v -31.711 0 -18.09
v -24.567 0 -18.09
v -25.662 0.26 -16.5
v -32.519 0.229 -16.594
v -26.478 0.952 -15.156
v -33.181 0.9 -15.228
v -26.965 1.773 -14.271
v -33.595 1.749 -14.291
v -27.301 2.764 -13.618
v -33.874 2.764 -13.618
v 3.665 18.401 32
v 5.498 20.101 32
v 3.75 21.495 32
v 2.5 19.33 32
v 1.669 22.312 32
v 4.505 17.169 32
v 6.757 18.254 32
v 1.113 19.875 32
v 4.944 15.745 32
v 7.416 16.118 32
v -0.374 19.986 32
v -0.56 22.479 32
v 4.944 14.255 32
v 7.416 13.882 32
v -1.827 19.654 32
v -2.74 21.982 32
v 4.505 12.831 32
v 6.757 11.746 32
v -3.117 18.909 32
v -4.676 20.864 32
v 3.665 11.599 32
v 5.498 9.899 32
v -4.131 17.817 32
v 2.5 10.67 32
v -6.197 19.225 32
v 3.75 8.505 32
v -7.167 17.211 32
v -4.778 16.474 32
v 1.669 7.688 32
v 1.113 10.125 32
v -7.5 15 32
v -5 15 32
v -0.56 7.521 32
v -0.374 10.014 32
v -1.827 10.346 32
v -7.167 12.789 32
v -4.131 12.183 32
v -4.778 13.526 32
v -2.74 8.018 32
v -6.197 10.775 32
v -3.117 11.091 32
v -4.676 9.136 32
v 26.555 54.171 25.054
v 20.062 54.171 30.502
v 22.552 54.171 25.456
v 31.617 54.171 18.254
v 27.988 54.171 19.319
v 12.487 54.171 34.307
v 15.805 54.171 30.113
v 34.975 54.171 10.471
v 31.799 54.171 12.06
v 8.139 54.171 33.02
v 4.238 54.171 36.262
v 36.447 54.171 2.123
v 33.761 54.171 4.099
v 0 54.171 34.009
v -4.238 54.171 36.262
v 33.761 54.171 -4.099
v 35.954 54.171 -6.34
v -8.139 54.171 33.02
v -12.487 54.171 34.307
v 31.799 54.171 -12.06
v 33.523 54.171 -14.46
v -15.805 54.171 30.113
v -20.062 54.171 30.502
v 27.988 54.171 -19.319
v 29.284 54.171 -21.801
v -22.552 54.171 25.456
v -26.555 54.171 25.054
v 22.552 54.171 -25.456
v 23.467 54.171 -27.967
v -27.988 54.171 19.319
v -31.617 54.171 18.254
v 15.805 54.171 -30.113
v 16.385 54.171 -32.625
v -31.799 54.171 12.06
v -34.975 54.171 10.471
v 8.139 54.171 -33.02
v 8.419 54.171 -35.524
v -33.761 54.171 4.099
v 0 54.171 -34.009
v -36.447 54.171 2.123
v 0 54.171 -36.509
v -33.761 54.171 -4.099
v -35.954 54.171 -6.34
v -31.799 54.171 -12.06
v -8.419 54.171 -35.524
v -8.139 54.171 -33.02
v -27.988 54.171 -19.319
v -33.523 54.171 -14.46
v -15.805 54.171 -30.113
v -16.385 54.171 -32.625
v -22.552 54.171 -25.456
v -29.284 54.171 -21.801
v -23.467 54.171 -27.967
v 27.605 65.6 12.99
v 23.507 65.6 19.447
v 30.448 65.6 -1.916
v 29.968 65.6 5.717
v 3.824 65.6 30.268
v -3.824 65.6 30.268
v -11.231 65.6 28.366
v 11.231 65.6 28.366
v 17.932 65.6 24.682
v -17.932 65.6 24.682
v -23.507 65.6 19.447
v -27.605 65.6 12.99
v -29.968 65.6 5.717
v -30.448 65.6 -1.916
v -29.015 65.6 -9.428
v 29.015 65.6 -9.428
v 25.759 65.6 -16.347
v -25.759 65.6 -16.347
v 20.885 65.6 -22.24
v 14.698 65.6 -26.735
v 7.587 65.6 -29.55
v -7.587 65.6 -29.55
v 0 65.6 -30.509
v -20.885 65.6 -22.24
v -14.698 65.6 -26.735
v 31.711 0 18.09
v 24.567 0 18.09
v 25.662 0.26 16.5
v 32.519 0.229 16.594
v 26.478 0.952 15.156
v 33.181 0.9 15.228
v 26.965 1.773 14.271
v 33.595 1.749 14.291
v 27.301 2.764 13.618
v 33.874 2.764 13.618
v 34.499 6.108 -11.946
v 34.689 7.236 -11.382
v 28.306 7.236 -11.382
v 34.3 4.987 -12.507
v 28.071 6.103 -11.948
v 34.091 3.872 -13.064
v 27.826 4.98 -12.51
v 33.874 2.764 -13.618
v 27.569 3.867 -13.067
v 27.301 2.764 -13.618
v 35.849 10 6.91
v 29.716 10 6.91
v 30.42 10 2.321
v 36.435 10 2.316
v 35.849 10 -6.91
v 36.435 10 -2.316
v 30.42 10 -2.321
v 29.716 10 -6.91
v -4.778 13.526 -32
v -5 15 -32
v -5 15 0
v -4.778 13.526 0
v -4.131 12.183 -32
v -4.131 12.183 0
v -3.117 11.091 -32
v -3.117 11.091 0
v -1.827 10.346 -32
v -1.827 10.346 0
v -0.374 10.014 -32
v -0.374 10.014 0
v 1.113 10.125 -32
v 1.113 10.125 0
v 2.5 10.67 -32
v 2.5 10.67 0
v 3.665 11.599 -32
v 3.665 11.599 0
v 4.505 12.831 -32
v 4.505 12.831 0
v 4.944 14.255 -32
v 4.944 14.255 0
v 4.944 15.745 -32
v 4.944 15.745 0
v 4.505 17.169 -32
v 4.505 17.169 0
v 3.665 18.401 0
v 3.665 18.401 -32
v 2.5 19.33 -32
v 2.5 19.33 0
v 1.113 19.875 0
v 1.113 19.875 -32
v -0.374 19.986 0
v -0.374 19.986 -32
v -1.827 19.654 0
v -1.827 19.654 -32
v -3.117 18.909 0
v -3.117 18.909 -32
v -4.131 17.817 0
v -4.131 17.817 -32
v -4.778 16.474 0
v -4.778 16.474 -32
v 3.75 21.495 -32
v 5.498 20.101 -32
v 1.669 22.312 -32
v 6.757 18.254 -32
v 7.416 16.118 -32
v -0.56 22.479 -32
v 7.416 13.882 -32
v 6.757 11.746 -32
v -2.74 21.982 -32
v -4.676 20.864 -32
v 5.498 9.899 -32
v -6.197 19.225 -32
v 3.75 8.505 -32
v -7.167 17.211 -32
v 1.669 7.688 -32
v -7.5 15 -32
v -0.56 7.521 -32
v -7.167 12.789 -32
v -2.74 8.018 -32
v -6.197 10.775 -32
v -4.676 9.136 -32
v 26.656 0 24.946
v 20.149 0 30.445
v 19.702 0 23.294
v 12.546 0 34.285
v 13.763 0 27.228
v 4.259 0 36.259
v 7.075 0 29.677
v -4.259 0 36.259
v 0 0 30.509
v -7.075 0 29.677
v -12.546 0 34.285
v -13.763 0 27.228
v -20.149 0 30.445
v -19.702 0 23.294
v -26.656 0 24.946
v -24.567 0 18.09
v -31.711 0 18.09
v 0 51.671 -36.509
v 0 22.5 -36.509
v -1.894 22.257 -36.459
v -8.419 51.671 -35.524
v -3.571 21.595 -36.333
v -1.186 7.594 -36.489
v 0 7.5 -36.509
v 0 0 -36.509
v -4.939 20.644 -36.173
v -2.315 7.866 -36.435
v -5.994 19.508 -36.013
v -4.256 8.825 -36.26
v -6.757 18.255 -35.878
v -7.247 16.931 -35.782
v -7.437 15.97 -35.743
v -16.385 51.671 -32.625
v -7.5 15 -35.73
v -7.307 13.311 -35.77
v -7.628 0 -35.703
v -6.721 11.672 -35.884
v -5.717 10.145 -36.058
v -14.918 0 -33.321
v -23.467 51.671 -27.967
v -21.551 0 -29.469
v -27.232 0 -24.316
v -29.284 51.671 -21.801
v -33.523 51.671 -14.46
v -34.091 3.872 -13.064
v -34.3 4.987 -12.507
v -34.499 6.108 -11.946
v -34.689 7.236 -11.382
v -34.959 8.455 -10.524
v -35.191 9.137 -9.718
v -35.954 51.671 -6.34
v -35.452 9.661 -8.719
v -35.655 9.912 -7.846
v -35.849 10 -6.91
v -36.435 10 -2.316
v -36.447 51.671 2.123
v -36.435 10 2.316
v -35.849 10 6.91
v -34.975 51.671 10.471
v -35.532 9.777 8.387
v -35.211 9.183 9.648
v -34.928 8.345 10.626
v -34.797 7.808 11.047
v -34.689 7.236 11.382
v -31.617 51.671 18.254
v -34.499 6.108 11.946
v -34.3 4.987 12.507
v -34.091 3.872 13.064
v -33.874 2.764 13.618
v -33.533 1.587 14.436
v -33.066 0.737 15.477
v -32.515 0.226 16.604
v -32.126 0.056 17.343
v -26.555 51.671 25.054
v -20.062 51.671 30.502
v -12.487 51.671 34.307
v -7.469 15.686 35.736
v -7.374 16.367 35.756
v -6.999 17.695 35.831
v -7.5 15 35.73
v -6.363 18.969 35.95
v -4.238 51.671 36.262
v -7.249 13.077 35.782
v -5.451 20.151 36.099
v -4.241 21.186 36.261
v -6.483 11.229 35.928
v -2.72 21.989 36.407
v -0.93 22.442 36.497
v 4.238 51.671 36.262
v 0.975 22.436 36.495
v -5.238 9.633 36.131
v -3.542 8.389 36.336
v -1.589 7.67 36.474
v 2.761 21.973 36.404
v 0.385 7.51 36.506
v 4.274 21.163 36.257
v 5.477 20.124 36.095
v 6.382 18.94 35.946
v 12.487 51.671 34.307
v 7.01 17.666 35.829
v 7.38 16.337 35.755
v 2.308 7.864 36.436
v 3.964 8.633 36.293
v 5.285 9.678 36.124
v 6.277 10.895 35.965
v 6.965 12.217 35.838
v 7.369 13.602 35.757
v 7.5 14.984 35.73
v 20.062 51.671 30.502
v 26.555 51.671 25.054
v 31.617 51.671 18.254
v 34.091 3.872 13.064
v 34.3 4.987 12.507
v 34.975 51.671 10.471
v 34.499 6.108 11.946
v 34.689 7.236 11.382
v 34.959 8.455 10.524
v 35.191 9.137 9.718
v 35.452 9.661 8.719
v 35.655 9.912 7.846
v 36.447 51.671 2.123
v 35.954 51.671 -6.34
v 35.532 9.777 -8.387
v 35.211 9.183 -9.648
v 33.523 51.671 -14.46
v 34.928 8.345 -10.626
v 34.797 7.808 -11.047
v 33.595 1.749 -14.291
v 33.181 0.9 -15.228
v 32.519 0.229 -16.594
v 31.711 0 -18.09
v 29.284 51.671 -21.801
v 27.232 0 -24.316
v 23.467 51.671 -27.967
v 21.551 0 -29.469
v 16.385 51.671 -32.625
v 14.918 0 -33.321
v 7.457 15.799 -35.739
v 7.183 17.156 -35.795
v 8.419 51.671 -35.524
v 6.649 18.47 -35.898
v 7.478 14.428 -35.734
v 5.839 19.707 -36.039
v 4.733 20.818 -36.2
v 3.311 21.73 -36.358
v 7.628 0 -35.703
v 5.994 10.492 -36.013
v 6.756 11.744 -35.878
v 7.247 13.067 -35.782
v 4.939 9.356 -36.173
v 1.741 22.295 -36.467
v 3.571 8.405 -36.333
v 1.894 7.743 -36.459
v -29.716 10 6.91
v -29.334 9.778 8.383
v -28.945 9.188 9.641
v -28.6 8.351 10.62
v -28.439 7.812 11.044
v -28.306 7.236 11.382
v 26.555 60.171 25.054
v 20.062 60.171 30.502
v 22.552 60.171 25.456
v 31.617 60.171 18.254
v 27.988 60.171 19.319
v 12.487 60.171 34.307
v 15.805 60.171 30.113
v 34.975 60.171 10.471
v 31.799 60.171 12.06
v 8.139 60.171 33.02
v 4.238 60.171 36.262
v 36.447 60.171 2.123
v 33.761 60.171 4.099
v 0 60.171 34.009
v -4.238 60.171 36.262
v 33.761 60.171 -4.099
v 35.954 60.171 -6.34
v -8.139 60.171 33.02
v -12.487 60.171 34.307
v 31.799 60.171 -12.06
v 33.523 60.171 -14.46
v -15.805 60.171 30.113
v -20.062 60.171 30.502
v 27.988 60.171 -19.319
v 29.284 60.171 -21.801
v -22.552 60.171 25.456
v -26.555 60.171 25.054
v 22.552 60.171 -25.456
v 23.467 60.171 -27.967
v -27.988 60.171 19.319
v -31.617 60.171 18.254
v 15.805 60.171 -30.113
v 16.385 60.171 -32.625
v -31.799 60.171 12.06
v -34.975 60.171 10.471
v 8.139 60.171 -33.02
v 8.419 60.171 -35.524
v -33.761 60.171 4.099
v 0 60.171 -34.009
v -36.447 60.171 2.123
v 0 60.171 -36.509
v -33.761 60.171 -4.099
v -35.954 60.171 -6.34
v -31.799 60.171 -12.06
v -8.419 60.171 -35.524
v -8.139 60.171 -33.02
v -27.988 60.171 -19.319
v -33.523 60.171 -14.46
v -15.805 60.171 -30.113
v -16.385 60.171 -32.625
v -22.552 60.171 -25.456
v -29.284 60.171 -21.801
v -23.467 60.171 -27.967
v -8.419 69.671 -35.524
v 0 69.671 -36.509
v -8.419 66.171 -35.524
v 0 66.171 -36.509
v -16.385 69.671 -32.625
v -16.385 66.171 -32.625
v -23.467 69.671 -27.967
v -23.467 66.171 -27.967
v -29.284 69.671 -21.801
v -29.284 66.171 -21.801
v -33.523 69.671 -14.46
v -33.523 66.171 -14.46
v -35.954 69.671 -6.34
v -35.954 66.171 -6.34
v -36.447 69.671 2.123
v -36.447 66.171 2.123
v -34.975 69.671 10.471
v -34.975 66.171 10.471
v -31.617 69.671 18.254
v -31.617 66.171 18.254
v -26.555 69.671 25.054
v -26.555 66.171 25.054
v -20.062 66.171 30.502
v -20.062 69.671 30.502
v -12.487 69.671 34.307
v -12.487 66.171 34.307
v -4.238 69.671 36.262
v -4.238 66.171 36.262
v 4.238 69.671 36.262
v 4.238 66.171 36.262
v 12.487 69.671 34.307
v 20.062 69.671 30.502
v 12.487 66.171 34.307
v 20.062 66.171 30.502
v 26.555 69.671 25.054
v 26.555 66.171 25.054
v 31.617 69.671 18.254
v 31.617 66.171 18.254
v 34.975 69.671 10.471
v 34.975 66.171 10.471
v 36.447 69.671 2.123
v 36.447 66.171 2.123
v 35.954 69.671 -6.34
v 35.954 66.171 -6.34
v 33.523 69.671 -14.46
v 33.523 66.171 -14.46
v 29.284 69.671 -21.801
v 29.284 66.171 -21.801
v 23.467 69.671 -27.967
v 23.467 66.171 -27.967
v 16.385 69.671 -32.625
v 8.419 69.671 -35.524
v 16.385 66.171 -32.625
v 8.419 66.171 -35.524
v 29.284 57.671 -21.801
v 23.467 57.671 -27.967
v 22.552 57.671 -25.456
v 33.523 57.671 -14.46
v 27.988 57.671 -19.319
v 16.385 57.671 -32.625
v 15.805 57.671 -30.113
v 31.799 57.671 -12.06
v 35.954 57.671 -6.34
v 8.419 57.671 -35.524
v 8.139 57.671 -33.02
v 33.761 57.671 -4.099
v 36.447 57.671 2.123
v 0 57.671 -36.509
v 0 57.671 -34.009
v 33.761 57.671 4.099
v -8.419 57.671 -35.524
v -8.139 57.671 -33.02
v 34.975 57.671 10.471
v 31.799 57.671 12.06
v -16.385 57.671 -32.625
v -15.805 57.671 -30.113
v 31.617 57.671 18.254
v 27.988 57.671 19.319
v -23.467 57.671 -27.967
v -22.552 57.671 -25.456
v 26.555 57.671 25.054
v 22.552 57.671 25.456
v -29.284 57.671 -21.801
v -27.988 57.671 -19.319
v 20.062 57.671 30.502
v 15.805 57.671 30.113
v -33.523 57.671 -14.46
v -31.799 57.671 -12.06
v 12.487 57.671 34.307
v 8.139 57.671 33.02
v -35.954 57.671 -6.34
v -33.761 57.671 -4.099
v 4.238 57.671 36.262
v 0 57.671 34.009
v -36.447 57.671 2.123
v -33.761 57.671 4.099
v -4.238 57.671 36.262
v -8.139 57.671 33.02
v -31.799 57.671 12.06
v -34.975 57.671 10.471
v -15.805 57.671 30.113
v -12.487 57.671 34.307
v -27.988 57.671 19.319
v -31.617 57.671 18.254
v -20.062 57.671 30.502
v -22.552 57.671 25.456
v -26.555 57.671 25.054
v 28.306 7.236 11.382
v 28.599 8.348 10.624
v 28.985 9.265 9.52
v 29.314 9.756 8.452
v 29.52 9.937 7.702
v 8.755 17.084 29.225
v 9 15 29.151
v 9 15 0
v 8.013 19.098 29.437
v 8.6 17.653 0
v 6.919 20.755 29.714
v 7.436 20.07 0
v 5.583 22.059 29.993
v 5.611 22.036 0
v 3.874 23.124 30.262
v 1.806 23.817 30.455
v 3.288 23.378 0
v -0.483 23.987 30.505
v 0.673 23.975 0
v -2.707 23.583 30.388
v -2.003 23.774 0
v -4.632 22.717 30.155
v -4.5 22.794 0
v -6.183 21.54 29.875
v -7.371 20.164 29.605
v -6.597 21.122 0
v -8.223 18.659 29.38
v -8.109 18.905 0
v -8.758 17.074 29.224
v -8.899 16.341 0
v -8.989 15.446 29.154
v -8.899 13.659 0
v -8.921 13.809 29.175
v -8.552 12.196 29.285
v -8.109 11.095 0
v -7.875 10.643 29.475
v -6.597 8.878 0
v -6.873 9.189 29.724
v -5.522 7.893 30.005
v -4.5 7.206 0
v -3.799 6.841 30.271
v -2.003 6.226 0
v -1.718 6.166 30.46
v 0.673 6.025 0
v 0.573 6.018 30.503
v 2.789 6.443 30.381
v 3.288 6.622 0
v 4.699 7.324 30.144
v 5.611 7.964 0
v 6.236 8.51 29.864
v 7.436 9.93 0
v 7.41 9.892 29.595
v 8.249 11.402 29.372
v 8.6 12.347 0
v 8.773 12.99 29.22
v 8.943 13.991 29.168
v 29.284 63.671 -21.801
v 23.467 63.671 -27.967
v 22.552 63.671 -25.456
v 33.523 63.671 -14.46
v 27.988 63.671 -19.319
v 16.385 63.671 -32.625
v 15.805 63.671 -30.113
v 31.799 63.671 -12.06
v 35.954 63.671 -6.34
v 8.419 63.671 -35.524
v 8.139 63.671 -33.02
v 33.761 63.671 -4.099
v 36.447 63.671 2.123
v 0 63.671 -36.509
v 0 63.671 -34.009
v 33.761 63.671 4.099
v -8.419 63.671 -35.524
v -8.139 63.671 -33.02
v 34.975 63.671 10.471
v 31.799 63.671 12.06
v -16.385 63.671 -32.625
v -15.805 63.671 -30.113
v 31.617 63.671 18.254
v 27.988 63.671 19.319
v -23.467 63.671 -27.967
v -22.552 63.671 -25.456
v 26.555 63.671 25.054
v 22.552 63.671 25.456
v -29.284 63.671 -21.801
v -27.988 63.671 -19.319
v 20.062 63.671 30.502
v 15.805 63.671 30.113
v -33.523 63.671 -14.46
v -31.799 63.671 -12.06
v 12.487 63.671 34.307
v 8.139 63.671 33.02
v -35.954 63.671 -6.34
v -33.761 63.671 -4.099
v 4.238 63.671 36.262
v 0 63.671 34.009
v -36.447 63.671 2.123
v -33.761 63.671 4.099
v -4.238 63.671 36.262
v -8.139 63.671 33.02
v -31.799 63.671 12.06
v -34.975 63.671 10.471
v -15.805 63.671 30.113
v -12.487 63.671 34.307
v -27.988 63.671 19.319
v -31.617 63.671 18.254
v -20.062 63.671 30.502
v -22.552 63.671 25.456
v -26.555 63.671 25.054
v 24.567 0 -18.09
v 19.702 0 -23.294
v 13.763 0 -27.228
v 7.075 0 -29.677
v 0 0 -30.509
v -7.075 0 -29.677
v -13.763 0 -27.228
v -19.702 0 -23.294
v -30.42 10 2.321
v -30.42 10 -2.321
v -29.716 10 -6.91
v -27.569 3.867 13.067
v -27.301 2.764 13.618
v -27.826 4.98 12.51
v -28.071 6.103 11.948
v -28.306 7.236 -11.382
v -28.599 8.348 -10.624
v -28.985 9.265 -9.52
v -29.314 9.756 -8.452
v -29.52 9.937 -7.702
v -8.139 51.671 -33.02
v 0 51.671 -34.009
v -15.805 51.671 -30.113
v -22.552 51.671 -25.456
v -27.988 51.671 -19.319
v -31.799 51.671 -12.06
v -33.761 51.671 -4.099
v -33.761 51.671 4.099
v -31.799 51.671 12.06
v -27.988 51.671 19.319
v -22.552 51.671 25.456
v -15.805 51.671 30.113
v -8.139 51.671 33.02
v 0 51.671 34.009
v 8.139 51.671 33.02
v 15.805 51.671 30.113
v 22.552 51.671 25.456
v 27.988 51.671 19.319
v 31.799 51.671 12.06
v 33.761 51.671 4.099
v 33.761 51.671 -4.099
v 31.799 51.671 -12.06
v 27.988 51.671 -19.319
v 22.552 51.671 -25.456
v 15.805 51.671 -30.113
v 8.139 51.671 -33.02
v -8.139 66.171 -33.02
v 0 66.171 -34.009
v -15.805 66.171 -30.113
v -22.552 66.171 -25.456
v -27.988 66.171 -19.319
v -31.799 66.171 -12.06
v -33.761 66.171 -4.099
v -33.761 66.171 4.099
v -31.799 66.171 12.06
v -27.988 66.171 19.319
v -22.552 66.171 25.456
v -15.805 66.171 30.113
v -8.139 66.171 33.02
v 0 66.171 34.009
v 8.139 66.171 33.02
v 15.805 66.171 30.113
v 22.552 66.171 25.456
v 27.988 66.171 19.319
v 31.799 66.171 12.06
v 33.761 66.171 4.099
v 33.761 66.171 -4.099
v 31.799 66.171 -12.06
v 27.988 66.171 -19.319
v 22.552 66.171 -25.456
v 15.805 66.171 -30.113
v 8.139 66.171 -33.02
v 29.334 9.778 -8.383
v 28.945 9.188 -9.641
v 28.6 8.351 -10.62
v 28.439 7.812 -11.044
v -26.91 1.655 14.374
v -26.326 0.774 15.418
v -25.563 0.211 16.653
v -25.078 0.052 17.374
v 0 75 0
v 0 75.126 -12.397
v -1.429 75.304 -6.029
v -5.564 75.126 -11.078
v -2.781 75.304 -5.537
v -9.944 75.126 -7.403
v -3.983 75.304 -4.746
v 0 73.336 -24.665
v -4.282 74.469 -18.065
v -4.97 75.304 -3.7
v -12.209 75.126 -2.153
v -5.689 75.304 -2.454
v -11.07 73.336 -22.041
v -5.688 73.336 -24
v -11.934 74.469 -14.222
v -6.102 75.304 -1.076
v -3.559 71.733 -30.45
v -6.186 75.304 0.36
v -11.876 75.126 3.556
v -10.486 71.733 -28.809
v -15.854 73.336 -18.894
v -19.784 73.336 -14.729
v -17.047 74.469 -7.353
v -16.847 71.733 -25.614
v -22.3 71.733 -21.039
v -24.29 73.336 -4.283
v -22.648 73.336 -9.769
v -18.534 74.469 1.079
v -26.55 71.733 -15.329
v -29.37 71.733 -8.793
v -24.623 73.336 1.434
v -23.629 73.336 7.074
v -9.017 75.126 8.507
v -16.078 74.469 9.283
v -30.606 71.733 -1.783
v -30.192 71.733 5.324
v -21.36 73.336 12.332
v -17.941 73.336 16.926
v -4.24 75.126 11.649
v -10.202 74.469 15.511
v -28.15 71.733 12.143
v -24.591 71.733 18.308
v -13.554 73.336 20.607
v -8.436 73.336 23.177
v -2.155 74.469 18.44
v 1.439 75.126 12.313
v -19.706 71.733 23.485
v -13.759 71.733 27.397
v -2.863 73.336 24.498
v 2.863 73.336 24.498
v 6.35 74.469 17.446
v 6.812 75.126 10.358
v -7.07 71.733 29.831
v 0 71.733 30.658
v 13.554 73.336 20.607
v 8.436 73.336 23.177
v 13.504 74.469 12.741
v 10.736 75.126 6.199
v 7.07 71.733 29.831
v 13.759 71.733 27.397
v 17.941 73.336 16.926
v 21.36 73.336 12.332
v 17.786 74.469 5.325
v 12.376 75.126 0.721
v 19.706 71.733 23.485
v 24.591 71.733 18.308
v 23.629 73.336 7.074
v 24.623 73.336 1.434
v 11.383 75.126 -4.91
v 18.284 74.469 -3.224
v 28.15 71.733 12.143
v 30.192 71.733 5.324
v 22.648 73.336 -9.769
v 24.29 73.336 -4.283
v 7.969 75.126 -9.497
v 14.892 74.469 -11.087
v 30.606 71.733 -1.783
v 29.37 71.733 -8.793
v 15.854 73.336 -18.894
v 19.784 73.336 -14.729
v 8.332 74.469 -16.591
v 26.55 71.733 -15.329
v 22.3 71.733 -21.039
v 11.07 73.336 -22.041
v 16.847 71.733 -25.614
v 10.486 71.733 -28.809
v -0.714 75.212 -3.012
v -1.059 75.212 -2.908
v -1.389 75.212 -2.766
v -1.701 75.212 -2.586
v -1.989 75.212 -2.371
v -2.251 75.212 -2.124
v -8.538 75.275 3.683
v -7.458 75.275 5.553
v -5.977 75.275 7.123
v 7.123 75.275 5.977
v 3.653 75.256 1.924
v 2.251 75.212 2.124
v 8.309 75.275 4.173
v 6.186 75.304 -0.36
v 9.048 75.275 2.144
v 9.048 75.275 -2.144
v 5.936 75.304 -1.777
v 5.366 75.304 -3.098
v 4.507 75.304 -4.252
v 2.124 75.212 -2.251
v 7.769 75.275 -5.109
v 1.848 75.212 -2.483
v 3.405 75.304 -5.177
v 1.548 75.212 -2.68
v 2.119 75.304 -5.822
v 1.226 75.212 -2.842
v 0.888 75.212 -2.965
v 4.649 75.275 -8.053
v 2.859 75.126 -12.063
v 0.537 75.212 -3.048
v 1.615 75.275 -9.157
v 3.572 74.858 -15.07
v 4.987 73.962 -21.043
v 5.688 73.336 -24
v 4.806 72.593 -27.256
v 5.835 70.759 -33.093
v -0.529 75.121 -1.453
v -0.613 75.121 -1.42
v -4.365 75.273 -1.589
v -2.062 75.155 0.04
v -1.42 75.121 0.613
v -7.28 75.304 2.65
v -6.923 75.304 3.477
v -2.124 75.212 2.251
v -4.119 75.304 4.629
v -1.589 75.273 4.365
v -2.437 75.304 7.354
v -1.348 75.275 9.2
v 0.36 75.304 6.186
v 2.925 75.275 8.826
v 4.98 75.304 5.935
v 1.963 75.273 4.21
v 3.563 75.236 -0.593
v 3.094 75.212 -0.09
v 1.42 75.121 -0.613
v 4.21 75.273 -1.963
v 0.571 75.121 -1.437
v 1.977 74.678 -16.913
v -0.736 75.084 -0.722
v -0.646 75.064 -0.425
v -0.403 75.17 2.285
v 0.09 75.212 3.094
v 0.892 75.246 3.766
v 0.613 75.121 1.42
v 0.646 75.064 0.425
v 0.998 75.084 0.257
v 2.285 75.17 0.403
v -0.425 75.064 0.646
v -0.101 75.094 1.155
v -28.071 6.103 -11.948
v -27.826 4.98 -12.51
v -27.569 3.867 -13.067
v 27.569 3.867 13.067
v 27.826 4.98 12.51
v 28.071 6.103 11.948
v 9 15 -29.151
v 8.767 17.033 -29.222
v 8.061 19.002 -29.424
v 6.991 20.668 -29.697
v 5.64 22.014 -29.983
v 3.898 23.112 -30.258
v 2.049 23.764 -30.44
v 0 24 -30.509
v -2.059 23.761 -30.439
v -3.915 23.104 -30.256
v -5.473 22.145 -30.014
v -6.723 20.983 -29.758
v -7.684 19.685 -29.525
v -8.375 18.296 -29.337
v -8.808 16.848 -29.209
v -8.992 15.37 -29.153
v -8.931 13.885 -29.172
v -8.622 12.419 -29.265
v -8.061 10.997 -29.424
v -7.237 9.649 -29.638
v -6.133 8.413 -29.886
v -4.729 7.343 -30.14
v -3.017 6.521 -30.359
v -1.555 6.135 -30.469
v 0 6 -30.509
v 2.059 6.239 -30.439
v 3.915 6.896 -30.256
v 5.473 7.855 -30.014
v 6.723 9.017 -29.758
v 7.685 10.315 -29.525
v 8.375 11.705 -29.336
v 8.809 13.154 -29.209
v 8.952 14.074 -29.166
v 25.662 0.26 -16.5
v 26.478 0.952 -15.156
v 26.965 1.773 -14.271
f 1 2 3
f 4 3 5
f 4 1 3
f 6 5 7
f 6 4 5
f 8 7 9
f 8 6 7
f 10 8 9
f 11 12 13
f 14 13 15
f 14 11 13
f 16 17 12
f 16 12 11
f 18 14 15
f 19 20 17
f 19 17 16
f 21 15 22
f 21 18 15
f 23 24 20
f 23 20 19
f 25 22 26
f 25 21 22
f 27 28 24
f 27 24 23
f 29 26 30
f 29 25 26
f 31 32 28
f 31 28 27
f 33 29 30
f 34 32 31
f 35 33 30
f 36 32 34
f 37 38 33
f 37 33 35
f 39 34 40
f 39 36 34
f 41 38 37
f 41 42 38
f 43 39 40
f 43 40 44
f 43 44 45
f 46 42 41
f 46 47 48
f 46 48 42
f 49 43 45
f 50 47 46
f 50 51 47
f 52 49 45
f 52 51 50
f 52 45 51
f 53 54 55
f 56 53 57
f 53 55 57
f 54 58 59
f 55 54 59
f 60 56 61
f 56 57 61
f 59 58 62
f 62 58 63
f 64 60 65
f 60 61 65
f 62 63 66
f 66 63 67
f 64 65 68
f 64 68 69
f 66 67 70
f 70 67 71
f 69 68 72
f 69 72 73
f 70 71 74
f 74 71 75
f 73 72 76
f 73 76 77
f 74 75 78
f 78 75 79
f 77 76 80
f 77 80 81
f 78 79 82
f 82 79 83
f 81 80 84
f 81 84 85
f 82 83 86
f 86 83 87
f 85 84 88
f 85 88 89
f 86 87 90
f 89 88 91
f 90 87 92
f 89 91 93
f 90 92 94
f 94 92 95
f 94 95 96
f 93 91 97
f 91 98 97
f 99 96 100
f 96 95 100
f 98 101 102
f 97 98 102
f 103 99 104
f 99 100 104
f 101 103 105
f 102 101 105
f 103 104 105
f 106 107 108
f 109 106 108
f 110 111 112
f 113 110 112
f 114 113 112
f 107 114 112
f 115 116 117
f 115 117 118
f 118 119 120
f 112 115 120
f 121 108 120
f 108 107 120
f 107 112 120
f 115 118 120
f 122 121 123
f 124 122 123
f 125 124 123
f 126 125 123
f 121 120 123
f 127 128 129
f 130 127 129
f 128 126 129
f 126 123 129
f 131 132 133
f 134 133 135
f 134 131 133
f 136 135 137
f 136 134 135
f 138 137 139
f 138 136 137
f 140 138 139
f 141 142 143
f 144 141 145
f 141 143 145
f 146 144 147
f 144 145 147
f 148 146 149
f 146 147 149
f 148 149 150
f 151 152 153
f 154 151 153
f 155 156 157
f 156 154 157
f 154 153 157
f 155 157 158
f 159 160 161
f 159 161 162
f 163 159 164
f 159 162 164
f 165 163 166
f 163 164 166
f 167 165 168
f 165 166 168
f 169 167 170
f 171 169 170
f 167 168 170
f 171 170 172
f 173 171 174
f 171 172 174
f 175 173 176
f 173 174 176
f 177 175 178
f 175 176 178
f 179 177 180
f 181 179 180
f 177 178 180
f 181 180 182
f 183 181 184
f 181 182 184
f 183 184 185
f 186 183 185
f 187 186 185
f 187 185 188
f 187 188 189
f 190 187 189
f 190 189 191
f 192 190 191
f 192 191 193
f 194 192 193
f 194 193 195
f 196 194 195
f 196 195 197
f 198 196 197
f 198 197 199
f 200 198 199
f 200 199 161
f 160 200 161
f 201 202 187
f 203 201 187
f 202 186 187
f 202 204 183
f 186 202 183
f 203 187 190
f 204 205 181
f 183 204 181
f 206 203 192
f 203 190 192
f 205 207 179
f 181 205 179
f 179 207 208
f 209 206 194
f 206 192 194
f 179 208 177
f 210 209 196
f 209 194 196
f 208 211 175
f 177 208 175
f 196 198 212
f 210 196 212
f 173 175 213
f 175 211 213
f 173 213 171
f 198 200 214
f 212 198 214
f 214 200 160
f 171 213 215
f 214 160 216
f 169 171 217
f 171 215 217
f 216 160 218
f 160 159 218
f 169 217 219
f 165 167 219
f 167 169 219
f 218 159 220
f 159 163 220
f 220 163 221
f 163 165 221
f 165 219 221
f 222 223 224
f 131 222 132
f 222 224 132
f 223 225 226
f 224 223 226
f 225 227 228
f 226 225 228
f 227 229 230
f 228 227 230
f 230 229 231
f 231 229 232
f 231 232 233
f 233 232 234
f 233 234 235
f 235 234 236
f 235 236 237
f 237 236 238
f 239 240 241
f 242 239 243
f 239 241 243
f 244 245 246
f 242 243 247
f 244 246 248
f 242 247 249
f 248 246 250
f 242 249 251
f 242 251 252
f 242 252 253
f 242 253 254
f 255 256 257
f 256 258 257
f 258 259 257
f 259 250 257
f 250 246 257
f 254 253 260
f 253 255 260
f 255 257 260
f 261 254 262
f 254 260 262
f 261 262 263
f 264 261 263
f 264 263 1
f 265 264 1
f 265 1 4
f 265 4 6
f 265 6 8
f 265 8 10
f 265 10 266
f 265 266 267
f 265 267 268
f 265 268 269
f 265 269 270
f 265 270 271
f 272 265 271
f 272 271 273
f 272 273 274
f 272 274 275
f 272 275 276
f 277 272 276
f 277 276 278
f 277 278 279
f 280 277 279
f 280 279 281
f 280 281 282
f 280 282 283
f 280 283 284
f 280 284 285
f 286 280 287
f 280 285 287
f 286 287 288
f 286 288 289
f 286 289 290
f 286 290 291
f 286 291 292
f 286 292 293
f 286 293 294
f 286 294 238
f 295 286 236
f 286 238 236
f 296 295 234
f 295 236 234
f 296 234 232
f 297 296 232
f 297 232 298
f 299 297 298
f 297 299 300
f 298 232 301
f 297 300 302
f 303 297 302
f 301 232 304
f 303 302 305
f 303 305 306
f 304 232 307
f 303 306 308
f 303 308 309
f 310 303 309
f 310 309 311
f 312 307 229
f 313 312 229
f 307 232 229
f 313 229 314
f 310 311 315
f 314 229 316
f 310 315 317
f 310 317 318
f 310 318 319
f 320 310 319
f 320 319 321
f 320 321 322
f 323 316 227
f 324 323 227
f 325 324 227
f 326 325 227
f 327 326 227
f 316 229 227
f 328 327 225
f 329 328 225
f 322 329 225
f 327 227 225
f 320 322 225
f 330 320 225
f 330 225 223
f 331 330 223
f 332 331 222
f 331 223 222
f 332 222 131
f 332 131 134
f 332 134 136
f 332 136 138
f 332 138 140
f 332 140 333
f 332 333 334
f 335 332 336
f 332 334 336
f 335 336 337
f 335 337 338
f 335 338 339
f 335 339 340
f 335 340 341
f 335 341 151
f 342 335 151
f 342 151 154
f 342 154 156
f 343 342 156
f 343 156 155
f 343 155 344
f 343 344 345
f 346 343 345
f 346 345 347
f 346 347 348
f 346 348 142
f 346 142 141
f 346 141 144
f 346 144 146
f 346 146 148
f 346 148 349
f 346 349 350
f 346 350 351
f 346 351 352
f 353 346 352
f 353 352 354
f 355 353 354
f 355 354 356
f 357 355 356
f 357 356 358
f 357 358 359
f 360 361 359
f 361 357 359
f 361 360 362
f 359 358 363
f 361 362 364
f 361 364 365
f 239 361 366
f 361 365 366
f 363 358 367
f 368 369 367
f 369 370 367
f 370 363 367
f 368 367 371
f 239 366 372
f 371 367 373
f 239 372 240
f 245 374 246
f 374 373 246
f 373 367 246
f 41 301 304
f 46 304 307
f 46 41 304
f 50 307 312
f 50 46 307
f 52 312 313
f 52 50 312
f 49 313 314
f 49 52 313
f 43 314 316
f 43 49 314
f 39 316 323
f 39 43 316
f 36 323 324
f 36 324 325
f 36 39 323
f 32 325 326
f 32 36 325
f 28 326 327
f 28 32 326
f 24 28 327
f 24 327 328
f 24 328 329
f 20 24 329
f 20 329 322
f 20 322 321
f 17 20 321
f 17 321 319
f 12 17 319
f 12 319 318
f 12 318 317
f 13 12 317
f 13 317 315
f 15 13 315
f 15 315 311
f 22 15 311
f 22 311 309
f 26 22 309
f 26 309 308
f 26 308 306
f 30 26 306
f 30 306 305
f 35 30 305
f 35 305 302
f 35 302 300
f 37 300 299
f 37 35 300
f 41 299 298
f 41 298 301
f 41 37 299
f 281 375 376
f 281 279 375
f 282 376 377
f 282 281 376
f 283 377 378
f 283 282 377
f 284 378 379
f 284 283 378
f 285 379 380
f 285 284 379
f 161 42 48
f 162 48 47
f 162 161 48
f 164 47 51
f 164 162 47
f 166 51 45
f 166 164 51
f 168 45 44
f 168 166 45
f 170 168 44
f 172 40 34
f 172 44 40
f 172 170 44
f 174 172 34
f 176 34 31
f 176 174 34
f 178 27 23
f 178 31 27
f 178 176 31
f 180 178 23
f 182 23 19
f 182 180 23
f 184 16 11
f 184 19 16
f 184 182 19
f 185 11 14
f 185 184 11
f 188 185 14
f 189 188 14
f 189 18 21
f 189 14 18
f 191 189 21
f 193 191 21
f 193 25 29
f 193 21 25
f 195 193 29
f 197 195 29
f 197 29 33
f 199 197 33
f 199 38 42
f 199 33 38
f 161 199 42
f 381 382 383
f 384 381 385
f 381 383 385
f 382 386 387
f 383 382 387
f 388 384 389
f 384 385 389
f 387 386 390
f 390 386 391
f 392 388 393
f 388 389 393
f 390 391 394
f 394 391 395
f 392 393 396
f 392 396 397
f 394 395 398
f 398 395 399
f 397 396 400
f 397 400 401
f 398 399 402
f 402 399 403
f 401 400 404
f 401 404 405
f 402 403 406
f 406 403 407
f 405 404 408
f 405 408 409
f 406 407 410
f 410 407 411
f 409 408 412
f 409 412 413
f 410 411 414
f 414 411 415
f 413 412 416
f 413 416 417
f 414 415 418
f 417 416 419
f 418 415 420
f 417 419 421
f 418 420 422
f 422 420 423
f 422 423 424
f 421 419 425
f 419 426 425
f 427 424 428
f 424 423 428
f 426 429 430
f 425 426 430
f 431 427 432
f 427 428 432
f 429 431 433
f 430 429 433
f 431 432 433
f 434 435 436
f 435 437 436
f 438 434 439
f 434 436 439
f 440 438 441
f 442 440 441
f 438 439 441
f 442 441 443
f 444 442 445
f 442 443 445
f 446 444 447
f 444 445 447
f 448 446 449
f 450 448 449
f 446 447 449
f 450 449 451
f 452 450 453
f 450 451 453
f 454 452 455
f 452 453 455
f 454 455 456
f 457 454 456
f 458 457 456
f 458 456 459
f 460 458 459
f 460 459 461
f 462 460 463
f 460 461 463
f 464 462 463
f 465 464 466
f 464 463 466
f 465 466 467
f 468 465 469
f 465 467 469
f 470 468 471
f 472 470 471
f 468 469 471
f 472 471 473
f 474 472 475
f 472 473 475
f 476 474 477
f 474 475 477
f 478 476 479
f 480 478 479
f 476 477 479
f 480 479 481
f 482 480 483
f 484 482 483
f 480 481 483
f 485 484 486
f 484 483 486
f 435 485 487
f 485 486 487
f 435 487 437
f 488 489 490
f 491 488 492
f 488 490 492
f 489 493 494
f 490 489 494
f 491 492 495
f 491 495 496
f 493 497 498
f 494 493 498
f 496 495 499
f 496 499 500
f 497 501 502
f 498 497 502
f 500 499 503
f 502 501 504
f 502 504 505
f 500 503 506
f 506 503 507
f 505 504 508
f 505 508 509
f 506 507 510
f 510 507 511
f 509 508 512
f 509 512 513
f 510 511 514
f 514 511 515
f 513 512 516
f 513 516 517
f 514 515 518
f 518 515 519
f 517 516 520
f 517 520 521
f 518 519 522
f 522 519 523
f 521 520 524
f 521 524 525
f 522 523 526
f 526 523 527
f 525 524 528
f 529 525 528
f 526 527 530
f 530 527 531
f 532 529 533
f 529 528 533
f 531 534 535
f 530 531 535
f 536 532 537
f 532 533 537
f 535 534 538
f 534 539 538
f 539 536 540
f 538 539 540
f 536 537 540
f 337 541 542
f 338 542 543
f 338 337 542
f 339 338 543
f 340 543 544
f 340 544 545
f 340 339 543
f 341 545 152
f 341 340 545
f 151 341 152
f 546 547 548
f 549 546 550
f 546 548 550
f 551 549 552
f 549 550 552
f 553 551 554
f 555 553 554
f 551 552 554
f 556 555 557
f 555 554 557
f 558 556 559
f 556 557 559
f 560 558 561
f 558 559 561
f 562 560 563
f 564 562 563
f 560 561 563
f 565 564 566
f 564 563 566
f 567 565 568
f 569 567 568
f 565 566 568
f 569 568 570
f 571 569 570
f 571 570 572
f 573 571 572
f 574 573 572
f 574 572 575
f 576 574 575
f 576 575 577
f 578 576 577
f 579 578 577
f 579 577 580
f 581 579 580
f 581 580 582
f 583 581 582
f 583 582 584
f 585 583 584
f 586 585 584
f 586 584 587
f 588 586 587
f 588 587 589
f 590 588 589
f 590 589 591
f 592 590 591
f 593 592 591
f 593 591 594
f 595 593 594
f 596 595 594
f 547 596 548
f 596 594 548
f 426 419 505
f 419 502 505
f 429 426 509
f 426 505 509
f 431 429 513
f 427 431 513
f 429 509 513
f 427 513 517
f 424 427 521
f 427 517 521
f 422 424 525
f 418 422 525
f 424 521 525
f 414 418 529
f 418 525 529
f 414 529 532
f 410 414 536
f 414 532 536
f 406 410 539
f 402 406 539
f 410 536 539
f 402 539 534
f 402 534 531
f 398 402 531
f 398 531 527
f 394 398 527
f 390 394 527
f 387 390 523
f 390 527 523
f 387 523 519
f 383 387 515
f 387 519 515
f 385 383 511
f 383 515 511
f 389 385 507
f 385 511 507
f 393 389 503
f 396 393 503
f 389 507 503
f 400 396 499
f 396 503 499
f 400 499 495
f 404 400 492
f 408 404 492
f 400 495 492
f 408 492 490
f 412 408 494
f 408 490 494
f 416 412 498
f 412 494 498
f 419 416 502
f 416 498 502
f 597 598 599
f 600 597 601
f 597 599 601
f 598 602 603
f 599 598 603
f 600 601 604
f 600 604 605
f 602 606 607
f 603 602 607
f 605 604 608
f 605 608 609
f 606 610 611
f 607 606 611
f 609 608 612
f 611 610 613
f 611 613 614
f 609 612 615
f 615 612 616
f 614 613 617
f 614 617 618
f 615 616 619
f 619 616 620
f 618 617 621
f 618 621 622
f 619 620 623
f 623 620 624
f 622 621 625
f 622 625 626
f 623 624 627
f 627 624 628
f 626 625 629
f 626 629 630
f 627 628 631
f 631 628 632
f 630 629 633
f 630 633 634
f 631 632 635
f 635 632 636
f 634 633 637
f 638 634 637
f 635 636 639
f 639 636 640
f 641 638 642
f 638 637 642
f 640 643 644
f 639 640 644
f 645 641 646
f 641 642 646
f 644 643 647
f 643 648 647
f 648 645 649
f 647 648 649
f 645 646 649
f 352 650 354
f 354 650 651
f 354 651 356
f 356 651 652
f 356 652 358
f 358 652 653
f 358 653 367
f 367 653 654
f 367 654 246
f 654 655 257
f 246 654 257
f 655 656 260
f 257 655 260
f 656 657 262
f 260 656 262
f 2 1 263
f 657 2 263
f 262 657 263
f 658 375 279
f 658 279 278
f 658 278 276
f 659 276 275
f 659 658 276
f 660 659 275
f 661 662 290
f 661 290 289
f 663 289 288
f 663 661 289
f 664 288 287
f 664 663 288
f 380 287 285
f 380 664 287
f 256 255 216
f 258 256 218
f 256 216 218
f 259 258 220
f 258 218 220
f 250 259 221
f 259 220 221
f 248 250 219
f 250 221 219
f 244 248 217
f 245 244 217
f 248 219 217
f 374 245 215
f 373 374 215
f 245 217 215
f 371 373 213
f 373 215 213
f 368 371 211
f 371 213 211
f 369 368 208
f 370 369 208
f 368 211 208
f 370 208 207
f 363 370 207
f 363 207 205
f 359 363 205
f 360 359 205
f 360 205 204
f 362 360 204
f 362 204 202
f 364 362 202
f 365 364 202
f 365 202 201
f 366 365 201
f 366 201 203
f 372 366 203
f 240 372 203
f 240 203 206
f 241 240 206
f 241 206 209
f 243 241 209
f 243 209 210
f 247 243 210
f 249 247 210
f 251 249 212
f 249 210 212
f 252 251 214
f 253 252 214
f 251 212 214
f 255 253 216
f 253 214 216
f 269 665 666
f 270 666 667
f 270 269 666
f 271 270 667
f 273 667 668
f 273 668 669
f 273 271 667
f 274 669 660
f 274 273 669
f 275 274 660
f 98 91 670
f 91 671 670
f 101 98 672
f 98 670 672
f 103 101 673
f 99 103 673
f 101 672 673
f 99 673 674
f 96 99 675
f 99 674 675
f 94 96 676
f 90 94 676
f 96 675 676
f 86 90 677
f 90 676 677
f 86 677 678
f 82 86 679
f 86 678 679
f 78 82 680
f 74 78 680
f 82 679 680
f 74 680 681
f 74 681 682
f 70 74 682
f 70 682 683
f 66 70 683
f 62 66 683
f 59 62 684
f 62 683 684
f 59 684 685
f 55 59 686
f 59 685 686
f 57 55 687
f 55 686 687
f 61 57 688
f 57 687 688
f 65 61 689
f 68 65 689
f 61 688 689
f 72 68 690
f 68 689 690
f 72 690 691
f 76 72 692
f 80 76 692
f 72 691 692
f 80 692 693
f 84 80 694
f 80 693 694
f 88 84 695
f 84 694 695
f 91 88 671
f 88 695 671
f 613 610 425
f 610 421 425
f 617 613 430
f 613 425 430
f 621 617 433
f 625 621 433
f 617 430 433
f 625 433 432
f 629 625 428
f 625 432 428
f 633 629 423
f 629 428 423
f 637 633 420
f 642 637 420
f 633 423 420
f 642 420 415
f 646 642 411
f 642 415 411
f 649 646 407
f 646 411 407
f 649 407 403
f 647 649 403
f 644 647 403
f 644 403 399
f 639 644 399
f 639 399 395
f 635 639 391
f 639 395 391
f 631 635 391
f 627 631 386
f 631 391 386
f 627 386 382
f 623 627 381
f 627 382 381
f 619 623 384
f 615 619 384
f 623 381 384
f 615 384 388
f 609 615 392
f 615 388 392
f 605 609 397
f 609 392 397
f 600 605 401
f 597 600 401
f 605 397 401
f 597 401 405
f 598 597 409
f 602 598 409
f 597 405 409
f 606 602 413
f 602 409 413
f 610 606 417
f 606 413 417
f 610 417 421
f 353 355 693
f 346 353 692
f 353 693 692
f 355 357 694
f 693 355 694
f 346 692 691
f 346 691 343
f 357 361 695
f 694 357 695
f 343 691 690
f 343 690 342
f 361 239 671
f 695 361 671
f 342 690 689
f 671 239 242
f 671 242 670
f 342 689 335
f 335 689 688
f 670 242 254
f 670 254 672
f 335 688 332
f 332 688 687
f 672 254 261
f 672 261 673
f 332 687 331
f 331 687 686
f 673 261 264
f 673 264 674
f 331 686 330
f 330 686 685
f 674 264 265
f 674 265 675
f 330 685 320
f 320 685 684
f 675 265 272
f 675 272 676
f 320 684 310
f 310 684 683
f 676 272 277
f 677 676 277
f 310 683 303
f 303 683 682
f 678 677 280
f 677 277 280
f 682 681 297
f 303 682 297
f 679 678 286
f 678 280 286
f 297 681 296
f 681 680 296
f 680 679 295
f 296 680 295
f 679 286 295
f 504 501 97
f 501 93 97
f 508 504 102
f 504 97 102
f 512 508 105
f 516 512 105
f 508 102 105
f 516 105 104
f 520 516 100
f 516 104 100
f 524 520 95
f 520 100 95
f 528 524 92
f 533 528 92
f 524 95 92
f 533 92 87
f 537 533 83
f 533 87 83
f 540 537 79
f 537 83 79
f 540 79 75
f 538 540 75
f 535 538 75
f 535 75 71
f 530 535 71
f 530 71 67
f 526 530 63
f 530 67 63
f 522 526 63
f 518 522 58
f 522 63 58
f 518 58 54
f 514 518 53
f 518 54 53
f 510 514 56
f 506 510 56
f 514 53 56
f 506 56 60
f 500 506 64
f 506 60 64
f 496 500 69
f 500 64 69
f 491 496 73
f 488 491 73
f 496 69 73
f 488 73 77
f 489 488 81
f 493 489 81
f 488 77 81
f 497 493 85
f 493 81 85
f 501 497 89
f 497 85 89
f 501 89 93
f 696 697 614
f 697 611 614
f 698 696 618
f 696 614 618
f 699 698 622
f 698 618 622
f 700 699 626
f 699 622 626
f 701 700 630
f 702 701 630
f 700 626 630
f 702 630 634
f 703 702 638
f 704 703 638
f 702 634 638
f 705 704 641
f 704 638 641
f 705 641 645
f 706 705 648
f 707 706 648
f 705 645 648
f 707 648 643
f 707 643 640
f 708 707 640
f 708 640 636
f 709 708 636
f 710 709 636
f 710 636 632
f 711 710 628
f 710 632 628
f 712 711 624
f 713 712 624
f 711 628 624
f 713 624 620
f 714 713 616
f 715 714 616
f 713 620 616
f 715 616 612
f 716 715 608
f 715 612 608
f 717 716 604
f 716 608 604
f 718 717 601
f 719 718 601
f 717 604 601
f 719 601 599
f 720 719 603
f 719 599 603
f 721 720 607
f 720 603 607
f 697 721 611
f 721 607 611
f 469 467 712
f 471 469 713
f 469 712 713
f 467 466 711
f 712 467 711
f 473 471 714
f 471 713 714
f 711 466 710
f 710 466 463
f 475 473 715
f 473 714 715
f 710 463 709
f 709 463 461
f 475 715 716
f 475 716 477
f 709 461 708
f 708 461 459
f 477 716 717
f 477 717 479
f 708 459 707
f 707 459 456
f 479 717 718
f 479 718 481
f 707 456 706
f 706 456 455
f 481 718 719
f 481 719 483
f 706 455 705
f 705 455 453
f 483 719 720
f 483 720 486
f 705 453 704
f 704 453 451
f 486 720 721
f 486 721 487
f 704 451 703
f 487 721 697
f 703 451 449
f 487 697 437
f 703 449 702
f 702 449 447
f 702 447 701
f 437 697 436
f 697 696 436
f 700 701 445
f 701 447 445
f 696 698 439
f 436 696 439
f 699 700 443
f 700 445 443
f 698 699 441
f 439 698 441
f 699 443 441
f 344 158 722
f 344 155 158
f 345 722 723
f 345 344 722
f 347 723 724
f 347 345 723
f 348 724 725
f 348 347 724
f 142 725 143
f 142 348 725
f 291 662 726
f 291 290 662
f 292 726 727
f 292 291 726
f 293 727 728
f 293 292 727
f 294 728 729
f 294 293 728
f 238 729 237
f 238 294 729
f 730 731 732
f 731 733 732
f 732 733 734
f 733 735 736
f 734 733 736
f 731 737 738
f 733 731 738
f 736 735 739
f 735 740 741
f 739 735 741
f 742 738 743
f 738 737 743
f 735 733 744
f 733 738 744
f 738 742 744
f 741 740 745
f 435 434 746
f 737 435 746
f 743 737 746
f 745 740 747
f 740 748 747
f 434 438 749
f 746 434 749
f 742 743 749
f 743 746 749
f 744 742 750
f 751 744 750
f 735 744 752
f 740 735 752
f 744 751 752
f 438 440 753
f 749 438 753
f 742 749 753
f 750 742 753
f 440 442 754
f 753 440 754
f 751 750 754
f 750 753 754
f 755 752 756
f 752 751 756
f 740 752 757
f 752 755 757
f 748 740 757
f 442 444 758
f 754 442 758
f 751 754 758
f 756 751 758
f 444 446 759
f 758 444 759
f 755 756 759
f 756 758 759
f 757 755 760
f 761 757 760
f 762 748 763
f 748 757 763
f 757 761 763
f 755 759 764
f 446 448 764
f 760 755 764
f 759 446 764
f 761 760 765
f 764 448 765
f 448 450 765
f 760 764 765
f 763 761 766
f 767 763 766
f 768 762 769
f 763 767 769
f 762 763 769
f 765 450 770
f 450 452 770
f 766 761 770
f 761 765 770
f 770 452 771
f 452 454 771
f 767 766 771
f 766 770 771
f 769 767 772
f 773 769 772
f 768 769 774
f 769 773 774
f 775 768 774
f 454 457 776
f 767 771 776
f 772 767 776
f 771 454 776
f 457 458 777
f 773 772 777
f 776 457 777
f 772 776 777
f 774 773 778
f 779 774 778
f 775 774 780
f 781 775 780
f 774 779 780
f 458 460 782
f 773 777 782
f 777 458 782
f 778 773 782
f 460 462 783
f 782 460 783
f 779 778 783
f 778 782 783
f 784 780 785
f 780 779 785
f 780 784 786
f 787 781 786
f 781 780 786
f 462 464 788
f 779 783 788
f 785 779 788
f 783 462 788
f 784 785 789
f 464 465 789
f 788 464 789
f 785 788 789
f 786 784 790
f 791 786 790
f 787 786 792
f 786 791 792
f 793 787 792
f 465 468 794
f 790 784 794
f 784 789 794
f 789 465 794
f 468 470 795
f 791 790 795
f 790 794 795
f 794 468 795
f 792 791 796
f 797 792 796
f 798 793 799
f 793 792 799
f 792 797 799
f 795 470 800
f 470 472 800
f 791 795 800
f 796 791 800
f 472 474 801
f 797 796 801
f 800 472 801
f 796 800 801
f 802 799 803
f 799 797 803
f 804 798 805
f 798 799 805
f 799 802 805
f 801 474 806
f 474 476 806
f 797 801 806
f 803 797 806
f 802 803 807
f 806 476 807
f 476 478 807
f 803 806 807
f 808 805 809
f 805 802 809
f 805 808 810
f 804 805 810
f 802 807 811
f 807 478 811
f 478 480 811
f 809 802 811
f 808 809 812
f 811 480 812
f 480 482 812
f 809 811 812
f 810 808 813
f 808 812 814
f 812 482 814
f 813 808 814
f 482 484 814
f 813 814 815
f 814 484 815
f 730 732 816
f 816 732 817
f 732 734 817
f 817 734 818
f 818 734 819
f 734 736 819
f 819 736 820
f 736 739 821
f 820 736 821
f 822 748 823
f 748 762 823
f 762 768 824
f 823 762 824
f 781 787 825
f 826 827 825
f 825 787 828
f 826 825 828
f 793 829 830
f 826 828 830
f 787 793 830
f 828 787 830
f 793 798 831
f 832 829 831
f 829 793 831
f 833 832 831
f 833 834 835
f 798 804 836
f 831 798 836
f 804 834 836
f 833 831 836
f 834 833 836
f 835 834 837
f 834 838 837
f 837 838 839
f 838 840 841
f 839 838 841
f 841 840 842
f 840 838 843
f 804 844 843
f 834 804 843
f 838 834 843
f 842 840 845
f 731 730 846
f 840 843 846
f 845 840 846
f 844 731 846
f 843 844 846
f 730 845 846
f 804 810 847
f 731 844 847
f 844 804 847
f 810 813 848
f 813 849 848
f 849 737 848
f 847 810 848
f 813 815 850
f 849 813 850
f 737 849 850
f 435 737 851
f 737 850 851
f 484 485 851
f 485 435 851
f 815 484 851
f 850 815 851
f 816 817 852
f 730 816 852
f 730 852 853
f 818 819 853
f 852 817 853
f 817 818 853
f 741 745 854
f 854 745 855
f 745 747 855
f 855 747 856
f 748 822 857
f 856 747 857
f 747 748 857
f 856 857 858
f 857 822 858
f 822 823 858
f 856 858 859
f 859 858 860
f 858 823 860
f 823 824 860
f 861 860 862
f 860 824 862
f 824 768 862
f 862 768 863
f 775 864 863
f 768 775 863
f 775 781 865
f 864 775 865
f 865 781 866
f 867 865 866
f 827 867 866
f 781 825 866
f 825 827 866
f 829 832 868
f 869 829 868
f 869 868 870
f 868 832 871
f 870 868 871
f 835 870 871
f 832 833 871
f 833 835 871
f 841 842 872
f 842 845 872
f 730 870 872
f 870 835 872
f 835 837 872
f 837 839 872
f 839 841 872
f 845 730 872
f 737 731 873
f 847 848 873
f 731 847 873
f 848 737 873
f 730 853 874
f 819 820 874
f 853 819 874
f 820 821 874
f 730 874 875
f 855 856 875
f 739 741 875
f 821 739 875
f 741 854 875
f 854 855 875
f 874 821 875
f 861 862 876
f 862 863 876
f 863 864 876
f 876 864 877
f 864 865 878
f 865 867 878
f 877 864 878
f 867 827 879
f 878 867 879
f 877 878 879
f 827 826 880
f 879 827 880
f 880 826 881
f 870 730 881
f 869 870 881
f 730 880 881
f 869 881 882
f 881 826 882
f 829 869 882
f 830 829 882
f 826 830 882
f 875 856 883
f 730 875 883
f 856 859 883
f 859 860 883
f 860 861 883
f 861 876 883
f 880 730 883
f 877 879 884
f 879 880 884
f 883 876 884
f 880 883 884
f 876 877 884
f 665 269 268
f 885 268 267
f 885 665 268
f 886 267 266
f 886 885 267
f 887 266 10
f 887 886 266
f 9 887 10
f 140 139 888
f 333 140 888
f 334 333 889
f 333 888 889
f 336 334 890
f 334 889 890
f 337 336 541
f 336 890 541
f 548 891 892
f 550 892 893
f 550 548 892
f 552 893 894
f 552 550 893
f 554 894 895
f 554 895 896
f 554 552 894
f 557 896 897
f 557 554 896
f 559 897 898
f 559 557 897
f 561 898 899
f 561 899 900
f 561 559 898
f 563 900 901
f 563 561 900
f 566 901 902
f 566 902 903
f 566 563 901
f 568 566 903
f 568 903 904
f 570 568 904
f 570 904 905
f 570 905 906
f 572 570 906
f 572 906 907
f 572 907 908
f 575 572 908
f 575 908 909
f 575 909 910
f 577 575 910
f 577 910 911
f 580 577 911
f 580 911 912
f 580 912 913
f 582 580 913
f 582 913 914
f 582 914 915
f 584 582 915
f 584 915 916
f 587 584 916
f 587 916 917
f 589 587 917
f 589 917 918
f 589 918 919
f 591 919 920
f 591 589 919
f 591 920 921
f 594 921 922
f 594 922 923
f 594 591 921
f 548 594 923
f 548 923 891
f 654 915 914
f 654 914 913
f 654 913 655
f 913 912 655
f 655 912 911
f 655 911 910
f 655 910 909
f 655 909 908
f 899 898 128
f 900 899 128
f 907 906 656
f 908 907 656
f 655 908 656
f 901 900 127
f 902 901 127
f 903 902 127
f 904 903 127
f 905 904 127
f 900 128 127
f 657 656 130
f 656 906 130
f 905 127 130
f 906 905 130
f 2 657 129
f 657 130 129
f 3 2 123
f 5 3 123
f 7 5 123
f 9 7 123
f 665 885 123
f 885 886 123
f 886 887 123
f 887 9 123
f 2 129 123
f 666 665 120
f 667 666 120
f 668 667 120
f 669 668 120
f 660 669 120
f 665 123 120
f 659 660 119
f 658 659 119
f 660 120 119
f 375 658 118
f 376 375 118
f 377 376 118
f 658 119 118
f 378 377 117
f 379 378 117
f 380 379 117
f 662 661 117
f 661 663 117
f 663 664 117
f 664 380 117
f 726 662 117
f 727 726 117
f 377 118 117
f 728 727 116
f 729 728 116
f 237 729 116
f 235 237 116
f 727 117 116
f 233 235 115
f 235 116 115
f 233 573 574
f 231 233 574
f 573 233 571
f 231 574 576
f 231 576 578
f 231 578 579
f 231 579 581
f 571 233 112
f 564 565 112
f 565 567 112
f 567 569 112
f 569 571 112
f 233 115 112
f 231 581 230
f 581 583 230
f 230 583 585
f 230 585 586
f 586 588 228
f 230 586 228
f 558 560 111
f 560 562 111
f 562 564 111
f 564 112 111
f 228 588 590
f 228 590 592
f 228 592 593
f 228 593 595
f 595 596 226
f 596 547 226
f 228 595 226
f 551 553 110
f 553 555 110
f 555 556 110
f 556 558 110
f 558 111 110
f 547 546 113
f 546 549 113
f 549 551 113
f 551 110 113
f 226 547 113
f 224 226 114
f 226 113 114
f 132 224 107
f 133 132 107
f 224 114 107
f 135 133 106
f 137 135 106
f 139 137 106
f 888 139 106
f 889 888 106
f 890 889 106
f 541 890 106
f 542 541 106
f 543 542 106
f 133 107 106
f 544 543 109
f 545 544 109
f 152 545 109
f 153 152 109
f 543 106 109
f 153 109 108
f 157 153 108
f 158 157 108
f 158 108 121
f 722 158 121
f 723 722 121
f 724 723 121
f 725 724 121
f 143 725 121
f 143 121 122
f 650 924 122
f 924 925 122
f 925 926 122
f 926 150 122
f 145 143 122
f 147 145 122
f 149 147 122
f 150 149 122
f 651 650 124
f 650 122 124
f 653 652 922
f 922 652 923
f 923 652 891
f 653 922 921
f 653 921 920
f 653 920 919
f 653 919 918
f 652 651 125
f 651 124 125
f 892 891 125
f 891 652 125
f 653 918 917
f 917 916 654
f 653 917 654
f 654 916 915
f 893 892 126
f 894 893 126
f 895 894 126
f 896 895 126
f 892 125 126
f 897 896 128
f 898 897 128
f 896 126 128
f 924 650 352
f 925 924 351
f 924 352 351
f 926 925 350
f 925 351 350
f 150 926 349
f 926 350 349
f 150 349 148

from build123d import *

# Parameters (mm, degrees)
CUT_EXTRUDE1_REACH                   = 93.307
CUT_EXTRUDE1_DIRECTION_2_REACH       = 93.307
FILLET1_R                            = 5
BOSS_EXTRUDE1_REACH                  = 93.307
BOSS_EXTRUDE1_END_RADIUS             = 30.50852022
SKETCH3_R                            = 9
BOSS_EXTRUDE1_DIRECTION_2_REACH      = 93.307
BOSS_EXTRUDE1_DIRECTION_2_END_RADIUS = 30.50852022
CUT_EXTRUDE2_REACH                   = 93.307
CUT_EXTRUDE2_END_RADIUS              = 36.50852022
SKETCH4_R                            = 5
CUT_EXTRUDE2_DIRECTION_2_REACH       = 93.307
CUT_EXTRUDE2_DIRECTION_2_END_RADIUS  = 36.50852022
SKETCH5_R                            = 7.5
CUT_EXTRUDE3_DEPTH                   = 10


with BuildPart() as part:
    # Sketch1 → Revolve1 (revolve)
    with BuildSketch(Plane.XY, mode=Mode.PRIVATE) as revolve1_sk:
        with BuildLine():
            Line((0, 65.6), (0, 70))
            Line((0, 70), (0, 75))
            ThreePointArc((0, 75), (-18.565651024, 74.469071932), (-36.50852022, 69.671288317))
            Line((-36.50852022, 69.671288317), (-36.50852022, 66.171288317))
            Line((-36.50852022, 66.171288317), (-34.00852022, 66.171288317))
            Line((-34.00852022, 66.171288317), (-34.00852022, 63.671288317))
            Line((-34.00852022, 63.671288317), (-36.50852022, 63.671288317))
            Line((-36.50852022, 63.671288317), (-36.50852022, 60.171288317))
            Line((-36.50852022, 60.171288317), (-34.00852022, 60.171288317))
            Line((-34.00852022, 60.171288317), (-34.00852022, 57.671288317))
            Line((-34.00852022, 57.671288317), (-36.50852022, 57.671288317))
            Line((-36.50852022, 57.671288317), (-36.50852022, 54.171288317))
            Line((-36.50852022, 54.171288317), (-34.00852022, 54.171288317))
            Line((-34.00852022, 54.171288317), (-34.00852022, 51.671288317))
            Line((-34.00852022, 51.671288317), (-36.50852022, 51.671288317))
            Line((-36.50852022, 51.671288317), (-36.50852022, 0))
            Line((-36.50852022, 0), (-30.50852022, 0))
            Line((-30.50852022, 0), (-30.50852022, 65.6))
            Line((-30.50852022, 65.6), (0, 65.6))
        make_face()
    revolve(revolve1_sk.sketch.rotate(Axis((0, 70, 0), (0, 1, 0)), 270), axis=Axis((0, 70, 0), (0, 1, 0)))

    # Sketch2 → Cut-Extrude1 (cut, up to next)
    with BuildSketch(Plane(origin=(0, 0, 0), x_dir=(0, 0, -1), z_dir=(1, 0, 0)), mode=Mode.PRIVATE) as cut_extrude1_sk1:
        Polygon((-15, 0), (-10, 10), (10, 10), (15, 0), align=None)
    cut_extrude1_tool1 = extrude(cut_extrude1_sk1.sketch, amount=-CUT_EXTRUDE1_REACH, mode=Mode.PRIVATE) & part.part
    add(cut_extrude1_tool1.solids().sort_by_distance((0, 4.666667, 0))[0], mode=Mode.SUBTRACT)

    # Sketch2 → Cut-Extrude1 direction 2 (cut, up to next)
    with BuildSketch(Plane(origin=(0, 0, 0), x_dir=(0, 0, -1), z_dir=(1, 0, 0)), mode=Mode.PRIVATE) as cut_extrude1_direction_2_sk1:
        Polygon((-15, 0), (-10, 10), (10, 10), (15, 0), align=None)
    cut_extrude1_direction_2_tool1 = extrude(cut_extrude1_direction_2_sk1.sketch, amount=CUT_EXTRUDE1_DIRECTION_2_REACH, mode=Mode.PRIVATE) & part.part
    add(cut_extrude1_direction_2_tool1.solids().sort_by_distance((0, 4.666667, 0))[0], mode=Mode.SUBTRACT)

    # Fillet1
    fillet1_edges = [part.edges().sort_by_distance(p)[0] for p in [
        (31.967677706, 10, -10),
        (-31.967677706, 10, -10),
        (29.92552018, 0, -15),
        (-29.92552018, 0, -15),
        (31.967677706, 10, 10),
        (-31.967677706, 10, 10),
        (-29.92552018, 0, 15),
        (29.92552018, 0, 15),
    ]]
    fillet(fillet1_edges, radius=FILLET1_R)

    # Boss-Extrude1: up to this cylinder (the profile starts inside it)
    boss_extrude1_end = Plane(origin=(0, 15, 0), z_dir=(0, -1, 0)) * Cylinder(BOSS_EXTRUDE1_END_RADIUS, 248.631040439, mode=Mode.PRIVATE)
    # Sketch3 → Boss-Extrude1 (add, up to the surface)
    with BuildSketch(Plane.XY, mode=Mode.PRIVATE) as boss_extrude1_sk1:
        with Locations((0, 15)):
            Circle(SKETCH3_R)
    boss_extrude1_tool1 = extrude(boss_extrude1_sk1.sketch, amount=BOSS_EXTRUDE1_REACH, mode=Mode.PRIVATE) & boss_extrude1_end
    add(boss_extrude1_tool1.solids().sort_by_distance((0, 15, 0))[0])

    # Boss-Extrude1 direction 2: up to this cylinder (the profile starts inside it)
    boss_extrude1_direction_2_end = Plane(origin=(0, 15, 0), z_dir=(0, -1, 0)) * Cylinder(BOSS_EXTRUDE1_DIRECTION_2_END_RADIUS, 248.631040439, mode=Mode.PRIVATE)
    # Sketch3 → Boss-Extrude1 direction 2 (add, up to the surface)
    with BuildSketch(Plane.XY, mode=Mode.PRIVATE) as boss_extrude1_direction_2_sk1:
        with Locations((0, 15)):
            Circle(SKETCH3_R)
    boss_extrude1_direction_2_tool1 = extrude(boss_extrude1_direction_2_sk1.sketch, amount=-BOSS_EXTRUDE1_DIRECTION_2_REACH, mode=Mode.PRIVATE) & boss_extrude1_direction_2_end
    add(boss_extrude1_direction_2_tool1.solids().sort_by_distance((0, 15, 0))[0])

    # Cut-Extrude2: up to this cylinder (the profile starts inside it)
    cut_extrude2_end = Plane(origin=(0, 15, 0), z_dir=(0, -1, 0)) * Cylinder(CUT_EXTRUDE2_END_RADIUS, 260.631040439, mode=Mode.PRIVATE)
    # Sketch4 → Cut-Extrude2 (cut, up to the surface)
    with BuildSketch(Plane.XY, mode=Mode.PRIVATE) as cut_extrude2_sk1:
        with Locations(Location((0, 15, 0), (0, 0, 180))):
            Circle(SKETCH4_R)
    cut_extrude2_tool1 = extrude(cut_extrude2_sk1.sketch, amount=-CUT_EXTRUDE2_REACH, mode=Mode.PRIVATE) & cut_extrude2_end
    add(cut_extrude2_tool1.solids().sort_by_distance((0, 15, 0))[0], mode=Mode.SUBTRACT)

    # Cut-Extrude2 direction 2: up to this cylinder (the profile starts inside it)
    cut_extrude2_direction_2_end = Plane(origin=(0, 15, 0), z_dir=(0, -1, 0)) * Cylinder(CUT_EXTRUDE2_DIRECTION_2_END_RADIUS, 260.631040439, mode=Mode.PRIVATE)
    # Sketch4 → Cut-Extrude2 direction 2 (cut, up to the surface)
    with BuildSketch(Plane.XY, mode=Mode.PRIVATE) as cut_extrude2_direction_2_sk1:
        with Locations(Location((0, 15, 0), (0, 0, 180))):
            Circle(SKETCH4_R)
    cut_extrude2_direction_2_tool1 = extrude(cut_extrude2_direction_2_sk1.sketch, amount=CUT_EXTRUDE2_DIRECTION_2_REACH, mode=Mode.PRIVATE) & cut_extrude2_direction_2_end
    add(cut_extrude2_direction_2_tool1.solids().sort_by_distance((0, 15, 0))[0], mode=Mode.SUBTRACT)

    # Sketch5 → Cut-Extrude3 (cut)
    with BuildSketch(Plane.XY.offset(32)):
        with Locations(Location((0, 15, 0), (0, 0, 180))):
            Circle(SKETCH5_R)
    cut_extrude3 = extrude(amount=CUT_EXTRUDE3_DEPTH, mode=Mode.SUBTRACT)

    # Mirror1: Cut-Extrude3 across plane
    add(cut_extrude3.mirror(Plane.XY), mode=Mode.SUBTRACT)


solid = part.part
